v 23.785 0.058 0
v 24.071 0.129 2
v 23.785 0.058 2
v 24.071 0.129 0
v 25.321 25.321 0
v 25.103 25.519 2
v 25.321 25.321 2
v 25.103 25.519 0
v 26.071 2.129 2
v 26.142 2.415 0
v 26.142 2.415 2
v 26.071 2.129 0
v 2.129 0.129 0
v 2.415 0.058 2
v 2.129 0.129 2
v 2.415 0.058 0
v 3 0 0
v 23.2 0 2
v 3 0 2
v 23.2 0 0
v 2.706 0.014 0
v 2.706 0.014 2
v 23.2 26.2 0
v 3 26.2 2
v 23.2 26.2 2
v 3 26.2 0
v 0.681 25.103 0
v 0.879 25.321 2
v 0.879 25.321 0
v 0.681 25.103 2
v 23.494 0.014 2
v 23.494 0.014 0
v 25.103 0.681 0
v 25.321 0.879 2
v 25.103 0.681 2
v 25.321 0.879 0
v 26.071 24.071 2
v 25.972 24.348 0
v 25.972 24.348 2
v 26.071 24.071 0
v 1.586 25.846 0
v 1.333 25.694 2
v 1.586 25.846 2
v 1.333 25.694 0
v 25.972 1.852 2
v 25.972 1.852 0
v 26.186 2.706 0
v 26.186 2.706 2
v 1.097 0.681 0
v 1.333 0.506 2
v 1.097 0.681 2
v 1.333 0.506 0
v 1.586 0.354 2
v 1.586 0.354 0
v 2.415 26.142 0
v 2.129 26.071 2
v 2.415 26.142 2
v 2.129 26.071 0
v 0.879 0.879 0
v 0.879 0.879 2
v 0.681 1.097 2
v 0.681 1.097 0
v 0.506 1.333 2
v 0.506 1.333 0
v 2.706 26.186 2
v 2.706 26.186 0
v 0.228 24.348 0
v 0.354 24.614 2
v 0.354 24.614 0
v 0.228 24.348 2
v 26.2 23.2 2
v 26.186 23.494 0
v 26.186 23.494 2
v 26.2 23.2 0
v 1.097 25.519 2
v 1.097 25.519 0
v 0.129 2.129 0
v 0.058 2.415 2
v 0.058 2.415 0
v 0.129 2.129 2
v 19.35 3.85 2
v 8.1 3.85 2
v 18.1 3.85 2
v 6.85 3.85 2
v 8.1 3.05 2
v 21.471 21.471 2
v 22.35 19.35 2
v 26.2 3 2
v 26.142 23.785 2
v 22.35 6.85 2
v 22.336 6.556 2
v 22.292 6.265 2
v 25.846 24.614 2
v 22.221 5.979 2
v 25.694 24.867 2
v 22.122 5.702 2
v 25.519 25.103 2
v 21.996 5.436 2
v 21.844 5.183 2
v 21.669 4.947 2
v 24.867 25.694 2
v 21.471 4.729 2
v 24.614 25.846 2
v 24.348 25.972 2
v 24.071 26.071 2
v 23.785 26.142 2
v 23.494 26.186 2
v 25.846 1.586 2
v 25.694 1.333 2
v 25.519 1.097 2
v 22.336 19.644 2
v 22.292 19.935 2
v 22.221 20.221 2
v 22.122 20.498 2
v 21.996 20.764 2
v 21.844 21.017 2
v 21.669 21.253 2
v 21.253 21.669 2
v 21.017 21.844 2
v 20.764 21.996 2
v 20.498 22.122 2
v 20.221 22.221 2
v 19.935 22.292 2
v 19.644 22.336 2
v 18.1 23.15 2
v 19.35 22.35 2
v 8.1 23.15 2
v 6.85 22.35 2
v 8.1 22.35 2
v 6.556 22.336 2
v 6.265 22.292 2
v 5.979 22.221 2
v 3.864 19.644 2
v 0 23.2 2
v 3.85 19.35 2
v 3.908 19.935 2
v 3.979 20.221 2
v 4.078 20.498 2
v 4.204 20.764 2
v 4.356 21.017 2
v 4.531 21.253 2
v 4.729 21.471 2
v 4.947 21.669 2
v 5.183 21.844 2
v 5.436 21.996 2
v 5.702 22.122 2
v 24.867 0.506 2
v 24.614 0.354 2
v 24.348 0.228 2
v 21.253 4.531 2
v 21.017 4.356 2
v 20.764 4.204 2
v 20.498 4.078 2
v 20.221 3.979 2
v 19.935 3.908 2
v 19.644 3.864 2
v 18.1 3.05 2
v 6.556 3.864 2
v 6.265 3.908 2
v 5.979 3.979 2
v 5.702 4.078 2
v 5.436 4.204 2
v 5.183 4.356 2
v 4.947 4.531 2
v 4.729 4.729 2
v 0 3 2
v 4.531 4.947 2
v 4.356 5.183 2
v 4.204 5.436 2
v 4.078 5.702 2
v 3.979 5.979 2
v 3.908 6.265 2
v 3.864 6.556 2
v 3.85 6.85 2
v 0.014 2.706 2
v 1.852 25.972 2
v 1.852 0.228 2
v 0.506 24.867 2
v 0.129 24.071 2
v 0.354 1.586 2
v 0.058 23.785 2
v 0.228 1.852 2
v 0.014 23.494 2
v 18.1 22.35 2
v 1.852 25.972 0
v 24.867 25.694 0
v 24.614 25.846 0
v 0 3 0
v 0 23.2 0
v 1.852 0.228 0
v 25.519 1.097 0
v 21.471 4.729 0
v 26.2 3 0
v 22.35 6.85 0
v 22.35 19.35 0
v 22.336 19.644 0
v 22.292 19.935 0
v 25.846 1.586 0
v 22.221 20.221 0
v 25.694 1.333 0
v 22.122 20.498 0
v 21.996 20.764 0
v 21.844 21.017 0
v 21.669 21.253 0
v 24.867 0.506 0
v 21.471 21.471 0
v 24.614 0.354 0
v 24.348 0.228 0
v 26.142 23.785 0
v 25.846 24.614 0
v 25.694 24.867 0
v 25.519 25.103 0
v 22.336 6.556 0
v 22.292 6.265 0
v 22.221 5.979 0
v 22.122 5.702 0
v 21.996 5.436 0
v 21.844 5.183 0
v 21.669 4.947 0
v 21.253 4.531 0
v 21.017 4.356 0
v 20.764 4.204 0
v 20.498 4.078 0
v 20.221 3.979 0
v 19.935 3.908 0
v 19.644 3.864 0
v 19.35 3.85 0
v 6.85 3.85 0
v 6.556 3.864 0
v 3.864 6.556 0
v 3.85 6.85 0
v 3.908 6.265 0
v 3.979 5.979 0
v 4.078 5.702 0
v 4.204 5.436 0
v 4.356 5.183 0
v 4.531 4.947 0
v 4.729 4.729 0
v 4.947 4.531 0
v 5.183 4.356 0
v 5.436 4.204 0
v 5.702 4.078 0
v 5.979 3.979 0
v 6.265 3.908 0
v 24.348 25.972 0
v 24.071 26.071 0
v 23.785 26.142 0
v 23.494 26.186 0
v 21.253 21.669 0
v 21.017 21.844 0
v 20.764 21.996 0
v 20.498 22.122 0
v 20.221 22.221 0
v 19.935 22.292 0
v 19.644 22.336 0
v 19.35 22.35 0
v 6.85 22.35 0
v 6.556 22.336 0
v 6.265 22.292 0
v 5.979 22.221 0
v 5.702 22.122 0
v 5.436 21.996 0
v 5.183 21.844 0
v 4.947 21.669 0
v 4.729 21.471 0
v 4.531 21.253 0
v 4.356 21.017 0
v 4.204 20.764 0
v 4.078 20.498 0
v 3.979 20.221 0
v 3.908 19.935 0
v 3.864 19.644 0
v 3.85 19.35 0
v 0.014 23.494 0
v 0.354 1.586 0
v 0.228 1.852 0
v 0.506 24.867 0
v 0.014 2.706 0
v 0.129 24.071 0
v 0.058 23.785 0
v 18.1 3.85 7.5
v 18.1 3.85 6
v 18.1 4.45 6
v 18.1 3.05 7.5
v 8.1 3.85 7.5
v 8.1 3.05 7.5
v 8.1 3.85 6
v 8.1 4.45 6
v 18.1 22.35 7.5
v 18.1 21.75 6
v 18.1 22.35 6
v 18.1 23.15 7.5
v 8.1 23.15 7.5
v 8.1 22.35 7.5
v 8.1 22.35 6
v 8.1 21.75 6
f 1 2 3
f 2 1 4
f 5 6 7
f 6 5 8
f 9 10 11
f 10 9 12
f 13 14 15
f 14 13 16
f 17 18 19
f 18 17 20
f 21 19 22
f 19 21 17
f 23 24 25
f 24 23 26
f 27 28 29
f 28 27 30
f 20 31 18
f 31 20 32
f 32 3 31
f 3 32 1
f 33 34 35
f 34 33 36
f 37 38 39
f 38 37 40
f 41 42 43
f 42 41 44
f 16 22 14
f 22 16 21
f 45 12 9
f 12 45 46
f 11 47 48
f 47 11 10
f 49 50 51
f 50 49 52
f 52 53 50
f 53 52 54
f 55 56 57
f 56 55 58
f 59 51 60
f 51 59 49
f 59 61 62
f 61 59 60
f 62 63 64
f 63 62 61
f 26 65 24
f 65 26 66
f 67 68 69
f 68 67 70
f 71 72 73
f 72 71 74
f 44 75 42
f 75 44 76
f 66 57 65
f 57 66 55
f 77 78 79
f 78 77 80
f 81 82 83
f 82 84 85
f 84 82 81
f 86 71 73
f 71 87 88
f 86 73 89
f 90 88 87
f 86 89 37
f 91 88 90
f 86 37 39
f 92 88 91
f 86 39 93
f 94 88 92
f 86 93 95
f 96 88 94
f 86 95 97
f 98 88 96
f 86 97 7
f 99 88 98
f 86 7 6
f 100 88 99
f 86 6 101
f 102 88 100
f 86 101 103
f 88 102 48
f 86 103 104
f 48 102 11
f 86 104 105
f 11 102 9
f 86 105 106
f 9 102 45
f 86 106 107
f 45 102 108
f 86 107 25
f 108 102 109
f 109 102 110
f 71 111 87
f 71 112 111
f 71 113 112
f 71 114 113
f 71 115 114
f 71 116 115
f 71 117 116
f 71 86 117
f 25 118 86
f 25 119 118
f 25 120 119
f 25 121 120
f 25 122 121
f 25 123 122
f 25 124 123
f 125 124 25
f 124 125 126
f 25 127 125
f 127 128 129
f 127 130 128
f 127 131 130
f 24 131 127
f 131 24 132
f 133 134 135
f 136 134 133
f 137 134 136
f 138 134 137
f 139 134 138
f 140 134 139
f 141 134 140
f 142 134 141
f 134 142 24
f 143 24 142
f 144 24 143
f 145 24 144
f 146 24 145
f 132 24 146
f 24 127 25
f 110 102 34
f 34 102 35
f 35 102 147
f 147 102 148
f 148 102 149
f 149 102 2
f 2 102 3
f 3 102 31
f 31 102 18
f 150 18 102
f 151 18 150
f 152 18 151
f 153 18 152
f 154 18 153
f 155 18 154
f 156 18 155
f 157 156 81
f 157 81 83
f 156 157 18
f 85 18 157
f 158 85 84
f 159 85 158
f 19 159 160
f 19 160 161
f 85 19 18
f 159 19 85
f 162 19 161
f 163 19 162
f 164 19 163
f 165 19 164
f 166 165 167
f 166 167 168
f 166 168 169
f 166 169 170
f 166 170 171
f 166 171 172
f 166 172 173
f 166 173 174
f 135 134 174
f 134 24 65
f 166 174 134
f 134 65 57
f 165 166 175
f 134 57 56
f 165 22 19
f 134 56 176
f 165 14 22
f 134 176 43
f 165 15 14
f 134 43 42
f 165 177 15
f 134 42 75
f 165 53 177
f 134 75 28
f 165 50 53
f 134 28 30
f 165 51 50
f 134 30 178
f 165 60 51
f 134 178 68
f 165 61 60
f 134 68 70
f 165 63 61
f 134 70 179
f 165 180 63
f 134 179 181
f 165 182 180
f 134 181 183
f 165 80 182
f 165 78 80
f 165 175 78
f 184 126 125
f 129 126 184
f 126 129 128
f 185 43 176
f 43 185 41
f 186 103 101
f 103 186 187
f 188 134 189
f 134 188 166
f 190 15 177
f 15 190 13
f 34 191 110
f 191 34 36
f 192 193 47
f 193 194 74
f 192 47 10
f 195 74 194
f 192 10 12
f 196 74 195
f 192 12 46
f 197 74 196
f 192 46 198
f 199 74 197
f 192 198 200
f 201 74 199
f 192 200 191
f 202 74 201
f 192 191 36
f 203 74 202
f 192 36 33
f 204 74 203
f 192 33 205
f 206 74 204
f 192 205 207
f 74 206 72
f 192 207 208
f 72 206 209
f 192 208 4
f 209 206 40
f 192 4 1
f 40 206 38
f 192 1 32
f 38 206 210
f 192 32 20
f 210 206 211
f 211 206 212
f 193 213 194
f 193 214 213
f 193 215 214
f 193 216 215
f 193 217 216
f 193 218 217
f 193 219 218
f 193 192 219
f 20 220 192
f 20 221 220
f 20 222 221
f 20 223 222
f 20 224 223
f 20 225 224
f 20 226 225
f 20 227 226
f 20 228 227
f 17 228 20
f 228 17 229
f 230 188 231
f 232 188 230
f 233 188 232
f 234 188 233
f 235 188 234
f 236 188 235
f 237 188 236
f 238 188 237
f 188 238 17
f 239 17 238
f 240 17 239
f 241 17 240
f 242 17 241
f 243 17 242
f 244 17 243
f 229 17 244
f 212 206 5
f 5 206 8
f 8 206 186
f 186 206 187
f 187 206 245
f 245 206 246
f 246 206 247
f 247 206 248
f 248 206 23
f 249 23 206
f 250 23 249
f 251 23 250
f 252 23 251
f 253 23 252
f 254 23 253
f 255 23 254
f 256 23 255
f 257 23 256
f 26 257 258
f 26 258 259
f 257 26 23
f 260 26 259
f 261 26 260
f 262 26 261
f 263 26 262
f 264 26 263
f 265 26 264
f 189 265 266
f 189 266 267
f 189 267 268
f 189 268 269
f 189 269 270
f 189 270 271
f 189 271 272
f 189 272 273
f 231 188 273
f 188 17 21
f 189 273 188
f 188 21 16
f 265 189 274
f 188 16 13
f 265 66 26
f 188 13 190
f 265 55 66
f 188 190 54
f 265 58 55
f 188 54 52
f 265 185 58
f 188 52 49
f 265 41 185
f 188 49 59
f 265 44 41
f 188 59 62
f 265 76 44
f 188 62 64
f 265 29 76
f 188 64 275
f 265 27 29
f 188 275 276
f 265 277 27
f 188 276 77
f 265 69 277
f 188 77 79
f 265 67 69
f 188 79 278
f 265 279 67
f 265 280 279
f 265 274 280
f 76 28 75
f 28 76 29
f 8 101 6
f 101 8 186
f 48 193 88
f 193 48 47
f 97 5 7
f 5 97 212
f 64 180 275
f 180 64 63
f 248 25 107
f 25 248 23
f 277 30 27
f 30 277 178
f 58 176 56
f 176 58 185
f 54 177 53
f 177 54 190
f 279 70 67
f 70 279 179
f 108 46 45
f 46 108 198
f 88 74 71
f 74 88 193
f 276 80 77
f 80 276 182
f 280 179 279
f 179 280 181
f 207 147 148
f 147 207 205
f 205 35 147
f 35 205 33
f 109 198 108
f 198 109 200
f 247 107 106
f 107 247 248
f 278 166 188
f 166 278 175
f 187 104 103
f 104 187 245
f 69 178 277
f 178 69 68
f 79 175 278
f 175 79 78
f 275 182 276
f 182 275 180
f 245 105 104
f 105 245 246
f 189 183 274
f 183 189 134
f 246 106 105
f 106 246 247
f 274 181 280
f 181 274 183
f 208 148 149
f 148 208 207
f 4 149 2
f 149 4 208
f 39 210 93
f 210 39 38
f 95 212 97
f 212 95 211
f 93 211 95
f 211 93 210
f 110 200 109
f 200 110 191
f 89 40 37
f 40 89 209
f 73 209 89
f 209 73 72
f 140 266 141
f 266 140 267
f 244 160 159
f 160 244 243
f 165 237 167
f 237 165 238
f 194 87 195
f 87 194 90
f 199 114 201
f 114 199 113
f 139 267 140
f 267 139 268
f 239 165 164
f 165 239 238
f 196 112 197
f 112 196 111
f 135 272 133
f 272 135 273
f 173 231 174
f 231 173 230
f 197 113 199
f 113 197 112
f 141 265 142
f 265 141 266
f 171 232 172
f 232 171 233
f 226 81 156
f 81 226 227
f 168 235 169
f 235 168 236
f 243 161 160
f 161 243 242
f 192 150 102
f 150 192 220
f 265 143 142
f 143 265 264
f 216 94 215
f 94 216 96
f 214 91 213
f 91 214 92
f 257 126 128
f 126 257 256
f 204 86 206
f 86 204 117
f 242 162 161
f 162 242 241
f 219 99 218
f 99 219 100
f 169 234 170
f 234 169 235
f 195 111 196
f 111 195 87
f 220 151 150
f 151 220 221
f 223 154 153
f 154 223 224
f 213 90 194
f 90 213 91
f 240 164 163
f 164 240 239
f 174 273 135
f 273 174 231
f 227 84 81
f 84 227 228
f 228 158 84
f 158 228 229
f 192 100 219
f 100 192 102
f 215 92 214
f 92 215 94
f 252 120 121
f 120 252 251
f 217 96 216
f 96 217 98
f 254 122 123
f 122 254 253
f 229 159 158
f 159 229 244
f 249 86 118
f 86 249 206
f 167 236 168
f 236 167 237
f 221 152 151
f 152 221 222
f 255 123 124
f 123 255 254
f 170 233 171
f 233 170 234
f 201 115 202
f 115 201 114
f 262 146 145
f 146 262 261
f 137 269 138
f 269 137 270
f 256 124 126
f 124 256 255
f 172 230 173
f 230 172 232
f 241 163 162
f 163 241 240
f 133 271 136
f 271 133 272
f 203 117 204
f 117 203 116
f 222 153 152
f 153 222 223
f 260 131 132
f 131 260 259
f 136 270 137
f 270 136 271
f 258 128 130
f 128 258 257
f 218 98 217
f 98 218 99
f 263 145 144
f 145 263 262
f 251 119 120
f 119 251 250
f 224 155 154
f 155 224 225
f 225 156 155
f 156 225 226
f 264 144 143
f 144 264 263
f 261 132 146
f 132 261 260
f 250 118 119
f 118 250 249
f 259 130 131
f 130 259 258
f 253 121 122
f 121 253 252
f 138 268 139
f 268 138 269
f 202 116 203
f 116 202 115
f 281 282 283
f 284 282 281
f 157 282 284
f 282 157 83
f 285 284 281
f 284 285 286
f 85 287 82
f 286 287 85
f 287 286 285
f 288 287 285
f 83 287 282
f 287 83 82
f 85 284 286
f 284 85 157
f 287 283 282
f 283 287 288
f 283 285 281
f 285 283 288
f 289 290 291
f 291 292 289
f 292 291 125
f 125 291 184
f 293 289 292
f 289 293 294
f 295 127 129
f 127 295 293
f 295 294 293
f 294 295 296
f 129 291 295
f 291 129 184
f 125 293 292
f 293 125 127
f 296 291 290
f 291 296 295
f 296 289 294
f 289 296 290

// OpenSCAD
// file: ptfe-port-config.scad
// PTFE 4-Tube Passthrough Port — Shared Configuration

// Performance
preview = false;
$fn = preview ? 32 : 64;

// PTFE tube dimensions (standard 1.75mm filament tube)
ptfe_od       = 4.0;   // outer diameter of PTFE tube
ptfe_clearance = 0.1;  // clearance per side for snug push-fit (FDM shrinkage helps grip)
hole_dia      = ptfe_od + ptfe_clearance * 2;

// Tube layout — 2x2 grid
tubes     = 4;
cols      = 2;
rows      = 2;
spacing   = 10;  // center-to-center distance between tubes

// Body dimensions
wall       = 2.0;  // minimum wall around outermost holes
gap        = 2.0;  // space between flanges for tent fabric

// Flange dimensions
flange_thick = 2.0;
flange_extra = 4.0; // how far flange extends beyond body on each side
collar_clearance = 0.15; // clearance per side for collar fit around shaft

// Derived
grid_w = (cols - 1) * spacing;
grid_h = (rows - 1) * spacing;
body_w = grid_w + hole_dia + wall * 2;
body_h = grid_h + hole_dia + wall * 2;
flange_w = body_w + flange_extra * 2;
flange_h = body_h + flange_extra * 2;
corner_r = 3;

// Snap-fit clip dimensions
clip_width = spacing;        // width of each clip (distance between two holes)
clip_thick = 0.8;            // tab thickness (thin for PLA flex)
lip_height = 1.5;            // barb height (catch edge)
lip_depth  = 0.6;            // barb protrusion beyond clip face (PLA-safe)
clip_reach = gap + flange_thick + lip_height; // tab extends through gap, flange, and barb flush with flange bottom
clip_clearance = 0.2;        // clearance around clip in the flange slot

// Stop plate — PTFE tube shoulder at top of shaft
stop_thick    = 1.0;         // thin plate thickness
filament_dia  = 2.0;         // filament passthrough hole (1.75mm filament + clearance)

module rounded_rect(w, h, depth, r) {
    translate([r, r, 0])
        minkowski() {
            cube([w - 2 * r, h - 2 * r, depth / 2]);
            cylinder(h = depth / 2, r = r);
        }
}

module tube_holes(depth) {
    for (c = [0 : cols - 1])
        for (r = [0 : rows - 1])
            translate([
                wall + hole_dia / 2 + c * spacing,
                wall + hole_dia / 2 + r * spacing,
                -1
            ])
                cylinder(h = depth + 2, d = hole_dia);
}
// main file
// PTFE Port — Collar: wraps the shaft and clamps against tent fabric
// Includes snap-fit clips that lock through slots in the shaft flange.
include <ptfe-port-config.scad>

module ptfe_port_collar() {
    shaft_w = body_w + collar_clearance * 2;
    shaft_h = body_h + collar_clearance * 2;
    hole_y_min = (flange_h - shaft_h) / 2;
    hole_y_max = (flange_h + shaft_h) / 2;

    clip_x = (flange_w - clip_width) / 2;

    union() {
        difference() {
            // Outer body — matches flange outer diameter
            rounded_rect(flange_w, flange_h, flange_thick, corner_r);

            // Hole sized to the shaft (body + clearance)
            translate([(flange_w - shaft_w) / 2, hole_y_min, -1])
                rounded_rect(shaft_w, shaft_h, flange_thick + 2, corner_r);
        }

        // Front clip — tab in collar material, flush with inner edge, barb faces inward (+Y)
        translate([clip_x, hole_y_min - clip_thick, flange_thick])
            snap_clip();

        // Back clip — tab in collar material, flush with inner edge, barb faces inward (-Y)
        translate([clip_x, hole_y_max + clip_thick, flange_thick])
            mirror([0, 1, 0])
                snap_clip();
    }
}

module snap_clip() {
    // Tab: thin flexible arm
    cube([clip_width, clip_thick, clip_reach]);

    // Barb — triangular prism: ramps from flush at top to full lip_depth at bottom
    // so the clip slides past the flange on insertion, then catches on removal
    translate([0, clip_thick, clip_reach - lip_height])
        rotate([90, 0, 90])
            linear_extrude(height = clip_width)
                polygon([
                    [0, 0],            // top of barb, flush with tab
                    [lip_depth, 0],    // top of barb, full protrusion
                    [0, lip_height]    // bottom catch edge, flush with tab
                ]);
}

ptfe_port_collar();
